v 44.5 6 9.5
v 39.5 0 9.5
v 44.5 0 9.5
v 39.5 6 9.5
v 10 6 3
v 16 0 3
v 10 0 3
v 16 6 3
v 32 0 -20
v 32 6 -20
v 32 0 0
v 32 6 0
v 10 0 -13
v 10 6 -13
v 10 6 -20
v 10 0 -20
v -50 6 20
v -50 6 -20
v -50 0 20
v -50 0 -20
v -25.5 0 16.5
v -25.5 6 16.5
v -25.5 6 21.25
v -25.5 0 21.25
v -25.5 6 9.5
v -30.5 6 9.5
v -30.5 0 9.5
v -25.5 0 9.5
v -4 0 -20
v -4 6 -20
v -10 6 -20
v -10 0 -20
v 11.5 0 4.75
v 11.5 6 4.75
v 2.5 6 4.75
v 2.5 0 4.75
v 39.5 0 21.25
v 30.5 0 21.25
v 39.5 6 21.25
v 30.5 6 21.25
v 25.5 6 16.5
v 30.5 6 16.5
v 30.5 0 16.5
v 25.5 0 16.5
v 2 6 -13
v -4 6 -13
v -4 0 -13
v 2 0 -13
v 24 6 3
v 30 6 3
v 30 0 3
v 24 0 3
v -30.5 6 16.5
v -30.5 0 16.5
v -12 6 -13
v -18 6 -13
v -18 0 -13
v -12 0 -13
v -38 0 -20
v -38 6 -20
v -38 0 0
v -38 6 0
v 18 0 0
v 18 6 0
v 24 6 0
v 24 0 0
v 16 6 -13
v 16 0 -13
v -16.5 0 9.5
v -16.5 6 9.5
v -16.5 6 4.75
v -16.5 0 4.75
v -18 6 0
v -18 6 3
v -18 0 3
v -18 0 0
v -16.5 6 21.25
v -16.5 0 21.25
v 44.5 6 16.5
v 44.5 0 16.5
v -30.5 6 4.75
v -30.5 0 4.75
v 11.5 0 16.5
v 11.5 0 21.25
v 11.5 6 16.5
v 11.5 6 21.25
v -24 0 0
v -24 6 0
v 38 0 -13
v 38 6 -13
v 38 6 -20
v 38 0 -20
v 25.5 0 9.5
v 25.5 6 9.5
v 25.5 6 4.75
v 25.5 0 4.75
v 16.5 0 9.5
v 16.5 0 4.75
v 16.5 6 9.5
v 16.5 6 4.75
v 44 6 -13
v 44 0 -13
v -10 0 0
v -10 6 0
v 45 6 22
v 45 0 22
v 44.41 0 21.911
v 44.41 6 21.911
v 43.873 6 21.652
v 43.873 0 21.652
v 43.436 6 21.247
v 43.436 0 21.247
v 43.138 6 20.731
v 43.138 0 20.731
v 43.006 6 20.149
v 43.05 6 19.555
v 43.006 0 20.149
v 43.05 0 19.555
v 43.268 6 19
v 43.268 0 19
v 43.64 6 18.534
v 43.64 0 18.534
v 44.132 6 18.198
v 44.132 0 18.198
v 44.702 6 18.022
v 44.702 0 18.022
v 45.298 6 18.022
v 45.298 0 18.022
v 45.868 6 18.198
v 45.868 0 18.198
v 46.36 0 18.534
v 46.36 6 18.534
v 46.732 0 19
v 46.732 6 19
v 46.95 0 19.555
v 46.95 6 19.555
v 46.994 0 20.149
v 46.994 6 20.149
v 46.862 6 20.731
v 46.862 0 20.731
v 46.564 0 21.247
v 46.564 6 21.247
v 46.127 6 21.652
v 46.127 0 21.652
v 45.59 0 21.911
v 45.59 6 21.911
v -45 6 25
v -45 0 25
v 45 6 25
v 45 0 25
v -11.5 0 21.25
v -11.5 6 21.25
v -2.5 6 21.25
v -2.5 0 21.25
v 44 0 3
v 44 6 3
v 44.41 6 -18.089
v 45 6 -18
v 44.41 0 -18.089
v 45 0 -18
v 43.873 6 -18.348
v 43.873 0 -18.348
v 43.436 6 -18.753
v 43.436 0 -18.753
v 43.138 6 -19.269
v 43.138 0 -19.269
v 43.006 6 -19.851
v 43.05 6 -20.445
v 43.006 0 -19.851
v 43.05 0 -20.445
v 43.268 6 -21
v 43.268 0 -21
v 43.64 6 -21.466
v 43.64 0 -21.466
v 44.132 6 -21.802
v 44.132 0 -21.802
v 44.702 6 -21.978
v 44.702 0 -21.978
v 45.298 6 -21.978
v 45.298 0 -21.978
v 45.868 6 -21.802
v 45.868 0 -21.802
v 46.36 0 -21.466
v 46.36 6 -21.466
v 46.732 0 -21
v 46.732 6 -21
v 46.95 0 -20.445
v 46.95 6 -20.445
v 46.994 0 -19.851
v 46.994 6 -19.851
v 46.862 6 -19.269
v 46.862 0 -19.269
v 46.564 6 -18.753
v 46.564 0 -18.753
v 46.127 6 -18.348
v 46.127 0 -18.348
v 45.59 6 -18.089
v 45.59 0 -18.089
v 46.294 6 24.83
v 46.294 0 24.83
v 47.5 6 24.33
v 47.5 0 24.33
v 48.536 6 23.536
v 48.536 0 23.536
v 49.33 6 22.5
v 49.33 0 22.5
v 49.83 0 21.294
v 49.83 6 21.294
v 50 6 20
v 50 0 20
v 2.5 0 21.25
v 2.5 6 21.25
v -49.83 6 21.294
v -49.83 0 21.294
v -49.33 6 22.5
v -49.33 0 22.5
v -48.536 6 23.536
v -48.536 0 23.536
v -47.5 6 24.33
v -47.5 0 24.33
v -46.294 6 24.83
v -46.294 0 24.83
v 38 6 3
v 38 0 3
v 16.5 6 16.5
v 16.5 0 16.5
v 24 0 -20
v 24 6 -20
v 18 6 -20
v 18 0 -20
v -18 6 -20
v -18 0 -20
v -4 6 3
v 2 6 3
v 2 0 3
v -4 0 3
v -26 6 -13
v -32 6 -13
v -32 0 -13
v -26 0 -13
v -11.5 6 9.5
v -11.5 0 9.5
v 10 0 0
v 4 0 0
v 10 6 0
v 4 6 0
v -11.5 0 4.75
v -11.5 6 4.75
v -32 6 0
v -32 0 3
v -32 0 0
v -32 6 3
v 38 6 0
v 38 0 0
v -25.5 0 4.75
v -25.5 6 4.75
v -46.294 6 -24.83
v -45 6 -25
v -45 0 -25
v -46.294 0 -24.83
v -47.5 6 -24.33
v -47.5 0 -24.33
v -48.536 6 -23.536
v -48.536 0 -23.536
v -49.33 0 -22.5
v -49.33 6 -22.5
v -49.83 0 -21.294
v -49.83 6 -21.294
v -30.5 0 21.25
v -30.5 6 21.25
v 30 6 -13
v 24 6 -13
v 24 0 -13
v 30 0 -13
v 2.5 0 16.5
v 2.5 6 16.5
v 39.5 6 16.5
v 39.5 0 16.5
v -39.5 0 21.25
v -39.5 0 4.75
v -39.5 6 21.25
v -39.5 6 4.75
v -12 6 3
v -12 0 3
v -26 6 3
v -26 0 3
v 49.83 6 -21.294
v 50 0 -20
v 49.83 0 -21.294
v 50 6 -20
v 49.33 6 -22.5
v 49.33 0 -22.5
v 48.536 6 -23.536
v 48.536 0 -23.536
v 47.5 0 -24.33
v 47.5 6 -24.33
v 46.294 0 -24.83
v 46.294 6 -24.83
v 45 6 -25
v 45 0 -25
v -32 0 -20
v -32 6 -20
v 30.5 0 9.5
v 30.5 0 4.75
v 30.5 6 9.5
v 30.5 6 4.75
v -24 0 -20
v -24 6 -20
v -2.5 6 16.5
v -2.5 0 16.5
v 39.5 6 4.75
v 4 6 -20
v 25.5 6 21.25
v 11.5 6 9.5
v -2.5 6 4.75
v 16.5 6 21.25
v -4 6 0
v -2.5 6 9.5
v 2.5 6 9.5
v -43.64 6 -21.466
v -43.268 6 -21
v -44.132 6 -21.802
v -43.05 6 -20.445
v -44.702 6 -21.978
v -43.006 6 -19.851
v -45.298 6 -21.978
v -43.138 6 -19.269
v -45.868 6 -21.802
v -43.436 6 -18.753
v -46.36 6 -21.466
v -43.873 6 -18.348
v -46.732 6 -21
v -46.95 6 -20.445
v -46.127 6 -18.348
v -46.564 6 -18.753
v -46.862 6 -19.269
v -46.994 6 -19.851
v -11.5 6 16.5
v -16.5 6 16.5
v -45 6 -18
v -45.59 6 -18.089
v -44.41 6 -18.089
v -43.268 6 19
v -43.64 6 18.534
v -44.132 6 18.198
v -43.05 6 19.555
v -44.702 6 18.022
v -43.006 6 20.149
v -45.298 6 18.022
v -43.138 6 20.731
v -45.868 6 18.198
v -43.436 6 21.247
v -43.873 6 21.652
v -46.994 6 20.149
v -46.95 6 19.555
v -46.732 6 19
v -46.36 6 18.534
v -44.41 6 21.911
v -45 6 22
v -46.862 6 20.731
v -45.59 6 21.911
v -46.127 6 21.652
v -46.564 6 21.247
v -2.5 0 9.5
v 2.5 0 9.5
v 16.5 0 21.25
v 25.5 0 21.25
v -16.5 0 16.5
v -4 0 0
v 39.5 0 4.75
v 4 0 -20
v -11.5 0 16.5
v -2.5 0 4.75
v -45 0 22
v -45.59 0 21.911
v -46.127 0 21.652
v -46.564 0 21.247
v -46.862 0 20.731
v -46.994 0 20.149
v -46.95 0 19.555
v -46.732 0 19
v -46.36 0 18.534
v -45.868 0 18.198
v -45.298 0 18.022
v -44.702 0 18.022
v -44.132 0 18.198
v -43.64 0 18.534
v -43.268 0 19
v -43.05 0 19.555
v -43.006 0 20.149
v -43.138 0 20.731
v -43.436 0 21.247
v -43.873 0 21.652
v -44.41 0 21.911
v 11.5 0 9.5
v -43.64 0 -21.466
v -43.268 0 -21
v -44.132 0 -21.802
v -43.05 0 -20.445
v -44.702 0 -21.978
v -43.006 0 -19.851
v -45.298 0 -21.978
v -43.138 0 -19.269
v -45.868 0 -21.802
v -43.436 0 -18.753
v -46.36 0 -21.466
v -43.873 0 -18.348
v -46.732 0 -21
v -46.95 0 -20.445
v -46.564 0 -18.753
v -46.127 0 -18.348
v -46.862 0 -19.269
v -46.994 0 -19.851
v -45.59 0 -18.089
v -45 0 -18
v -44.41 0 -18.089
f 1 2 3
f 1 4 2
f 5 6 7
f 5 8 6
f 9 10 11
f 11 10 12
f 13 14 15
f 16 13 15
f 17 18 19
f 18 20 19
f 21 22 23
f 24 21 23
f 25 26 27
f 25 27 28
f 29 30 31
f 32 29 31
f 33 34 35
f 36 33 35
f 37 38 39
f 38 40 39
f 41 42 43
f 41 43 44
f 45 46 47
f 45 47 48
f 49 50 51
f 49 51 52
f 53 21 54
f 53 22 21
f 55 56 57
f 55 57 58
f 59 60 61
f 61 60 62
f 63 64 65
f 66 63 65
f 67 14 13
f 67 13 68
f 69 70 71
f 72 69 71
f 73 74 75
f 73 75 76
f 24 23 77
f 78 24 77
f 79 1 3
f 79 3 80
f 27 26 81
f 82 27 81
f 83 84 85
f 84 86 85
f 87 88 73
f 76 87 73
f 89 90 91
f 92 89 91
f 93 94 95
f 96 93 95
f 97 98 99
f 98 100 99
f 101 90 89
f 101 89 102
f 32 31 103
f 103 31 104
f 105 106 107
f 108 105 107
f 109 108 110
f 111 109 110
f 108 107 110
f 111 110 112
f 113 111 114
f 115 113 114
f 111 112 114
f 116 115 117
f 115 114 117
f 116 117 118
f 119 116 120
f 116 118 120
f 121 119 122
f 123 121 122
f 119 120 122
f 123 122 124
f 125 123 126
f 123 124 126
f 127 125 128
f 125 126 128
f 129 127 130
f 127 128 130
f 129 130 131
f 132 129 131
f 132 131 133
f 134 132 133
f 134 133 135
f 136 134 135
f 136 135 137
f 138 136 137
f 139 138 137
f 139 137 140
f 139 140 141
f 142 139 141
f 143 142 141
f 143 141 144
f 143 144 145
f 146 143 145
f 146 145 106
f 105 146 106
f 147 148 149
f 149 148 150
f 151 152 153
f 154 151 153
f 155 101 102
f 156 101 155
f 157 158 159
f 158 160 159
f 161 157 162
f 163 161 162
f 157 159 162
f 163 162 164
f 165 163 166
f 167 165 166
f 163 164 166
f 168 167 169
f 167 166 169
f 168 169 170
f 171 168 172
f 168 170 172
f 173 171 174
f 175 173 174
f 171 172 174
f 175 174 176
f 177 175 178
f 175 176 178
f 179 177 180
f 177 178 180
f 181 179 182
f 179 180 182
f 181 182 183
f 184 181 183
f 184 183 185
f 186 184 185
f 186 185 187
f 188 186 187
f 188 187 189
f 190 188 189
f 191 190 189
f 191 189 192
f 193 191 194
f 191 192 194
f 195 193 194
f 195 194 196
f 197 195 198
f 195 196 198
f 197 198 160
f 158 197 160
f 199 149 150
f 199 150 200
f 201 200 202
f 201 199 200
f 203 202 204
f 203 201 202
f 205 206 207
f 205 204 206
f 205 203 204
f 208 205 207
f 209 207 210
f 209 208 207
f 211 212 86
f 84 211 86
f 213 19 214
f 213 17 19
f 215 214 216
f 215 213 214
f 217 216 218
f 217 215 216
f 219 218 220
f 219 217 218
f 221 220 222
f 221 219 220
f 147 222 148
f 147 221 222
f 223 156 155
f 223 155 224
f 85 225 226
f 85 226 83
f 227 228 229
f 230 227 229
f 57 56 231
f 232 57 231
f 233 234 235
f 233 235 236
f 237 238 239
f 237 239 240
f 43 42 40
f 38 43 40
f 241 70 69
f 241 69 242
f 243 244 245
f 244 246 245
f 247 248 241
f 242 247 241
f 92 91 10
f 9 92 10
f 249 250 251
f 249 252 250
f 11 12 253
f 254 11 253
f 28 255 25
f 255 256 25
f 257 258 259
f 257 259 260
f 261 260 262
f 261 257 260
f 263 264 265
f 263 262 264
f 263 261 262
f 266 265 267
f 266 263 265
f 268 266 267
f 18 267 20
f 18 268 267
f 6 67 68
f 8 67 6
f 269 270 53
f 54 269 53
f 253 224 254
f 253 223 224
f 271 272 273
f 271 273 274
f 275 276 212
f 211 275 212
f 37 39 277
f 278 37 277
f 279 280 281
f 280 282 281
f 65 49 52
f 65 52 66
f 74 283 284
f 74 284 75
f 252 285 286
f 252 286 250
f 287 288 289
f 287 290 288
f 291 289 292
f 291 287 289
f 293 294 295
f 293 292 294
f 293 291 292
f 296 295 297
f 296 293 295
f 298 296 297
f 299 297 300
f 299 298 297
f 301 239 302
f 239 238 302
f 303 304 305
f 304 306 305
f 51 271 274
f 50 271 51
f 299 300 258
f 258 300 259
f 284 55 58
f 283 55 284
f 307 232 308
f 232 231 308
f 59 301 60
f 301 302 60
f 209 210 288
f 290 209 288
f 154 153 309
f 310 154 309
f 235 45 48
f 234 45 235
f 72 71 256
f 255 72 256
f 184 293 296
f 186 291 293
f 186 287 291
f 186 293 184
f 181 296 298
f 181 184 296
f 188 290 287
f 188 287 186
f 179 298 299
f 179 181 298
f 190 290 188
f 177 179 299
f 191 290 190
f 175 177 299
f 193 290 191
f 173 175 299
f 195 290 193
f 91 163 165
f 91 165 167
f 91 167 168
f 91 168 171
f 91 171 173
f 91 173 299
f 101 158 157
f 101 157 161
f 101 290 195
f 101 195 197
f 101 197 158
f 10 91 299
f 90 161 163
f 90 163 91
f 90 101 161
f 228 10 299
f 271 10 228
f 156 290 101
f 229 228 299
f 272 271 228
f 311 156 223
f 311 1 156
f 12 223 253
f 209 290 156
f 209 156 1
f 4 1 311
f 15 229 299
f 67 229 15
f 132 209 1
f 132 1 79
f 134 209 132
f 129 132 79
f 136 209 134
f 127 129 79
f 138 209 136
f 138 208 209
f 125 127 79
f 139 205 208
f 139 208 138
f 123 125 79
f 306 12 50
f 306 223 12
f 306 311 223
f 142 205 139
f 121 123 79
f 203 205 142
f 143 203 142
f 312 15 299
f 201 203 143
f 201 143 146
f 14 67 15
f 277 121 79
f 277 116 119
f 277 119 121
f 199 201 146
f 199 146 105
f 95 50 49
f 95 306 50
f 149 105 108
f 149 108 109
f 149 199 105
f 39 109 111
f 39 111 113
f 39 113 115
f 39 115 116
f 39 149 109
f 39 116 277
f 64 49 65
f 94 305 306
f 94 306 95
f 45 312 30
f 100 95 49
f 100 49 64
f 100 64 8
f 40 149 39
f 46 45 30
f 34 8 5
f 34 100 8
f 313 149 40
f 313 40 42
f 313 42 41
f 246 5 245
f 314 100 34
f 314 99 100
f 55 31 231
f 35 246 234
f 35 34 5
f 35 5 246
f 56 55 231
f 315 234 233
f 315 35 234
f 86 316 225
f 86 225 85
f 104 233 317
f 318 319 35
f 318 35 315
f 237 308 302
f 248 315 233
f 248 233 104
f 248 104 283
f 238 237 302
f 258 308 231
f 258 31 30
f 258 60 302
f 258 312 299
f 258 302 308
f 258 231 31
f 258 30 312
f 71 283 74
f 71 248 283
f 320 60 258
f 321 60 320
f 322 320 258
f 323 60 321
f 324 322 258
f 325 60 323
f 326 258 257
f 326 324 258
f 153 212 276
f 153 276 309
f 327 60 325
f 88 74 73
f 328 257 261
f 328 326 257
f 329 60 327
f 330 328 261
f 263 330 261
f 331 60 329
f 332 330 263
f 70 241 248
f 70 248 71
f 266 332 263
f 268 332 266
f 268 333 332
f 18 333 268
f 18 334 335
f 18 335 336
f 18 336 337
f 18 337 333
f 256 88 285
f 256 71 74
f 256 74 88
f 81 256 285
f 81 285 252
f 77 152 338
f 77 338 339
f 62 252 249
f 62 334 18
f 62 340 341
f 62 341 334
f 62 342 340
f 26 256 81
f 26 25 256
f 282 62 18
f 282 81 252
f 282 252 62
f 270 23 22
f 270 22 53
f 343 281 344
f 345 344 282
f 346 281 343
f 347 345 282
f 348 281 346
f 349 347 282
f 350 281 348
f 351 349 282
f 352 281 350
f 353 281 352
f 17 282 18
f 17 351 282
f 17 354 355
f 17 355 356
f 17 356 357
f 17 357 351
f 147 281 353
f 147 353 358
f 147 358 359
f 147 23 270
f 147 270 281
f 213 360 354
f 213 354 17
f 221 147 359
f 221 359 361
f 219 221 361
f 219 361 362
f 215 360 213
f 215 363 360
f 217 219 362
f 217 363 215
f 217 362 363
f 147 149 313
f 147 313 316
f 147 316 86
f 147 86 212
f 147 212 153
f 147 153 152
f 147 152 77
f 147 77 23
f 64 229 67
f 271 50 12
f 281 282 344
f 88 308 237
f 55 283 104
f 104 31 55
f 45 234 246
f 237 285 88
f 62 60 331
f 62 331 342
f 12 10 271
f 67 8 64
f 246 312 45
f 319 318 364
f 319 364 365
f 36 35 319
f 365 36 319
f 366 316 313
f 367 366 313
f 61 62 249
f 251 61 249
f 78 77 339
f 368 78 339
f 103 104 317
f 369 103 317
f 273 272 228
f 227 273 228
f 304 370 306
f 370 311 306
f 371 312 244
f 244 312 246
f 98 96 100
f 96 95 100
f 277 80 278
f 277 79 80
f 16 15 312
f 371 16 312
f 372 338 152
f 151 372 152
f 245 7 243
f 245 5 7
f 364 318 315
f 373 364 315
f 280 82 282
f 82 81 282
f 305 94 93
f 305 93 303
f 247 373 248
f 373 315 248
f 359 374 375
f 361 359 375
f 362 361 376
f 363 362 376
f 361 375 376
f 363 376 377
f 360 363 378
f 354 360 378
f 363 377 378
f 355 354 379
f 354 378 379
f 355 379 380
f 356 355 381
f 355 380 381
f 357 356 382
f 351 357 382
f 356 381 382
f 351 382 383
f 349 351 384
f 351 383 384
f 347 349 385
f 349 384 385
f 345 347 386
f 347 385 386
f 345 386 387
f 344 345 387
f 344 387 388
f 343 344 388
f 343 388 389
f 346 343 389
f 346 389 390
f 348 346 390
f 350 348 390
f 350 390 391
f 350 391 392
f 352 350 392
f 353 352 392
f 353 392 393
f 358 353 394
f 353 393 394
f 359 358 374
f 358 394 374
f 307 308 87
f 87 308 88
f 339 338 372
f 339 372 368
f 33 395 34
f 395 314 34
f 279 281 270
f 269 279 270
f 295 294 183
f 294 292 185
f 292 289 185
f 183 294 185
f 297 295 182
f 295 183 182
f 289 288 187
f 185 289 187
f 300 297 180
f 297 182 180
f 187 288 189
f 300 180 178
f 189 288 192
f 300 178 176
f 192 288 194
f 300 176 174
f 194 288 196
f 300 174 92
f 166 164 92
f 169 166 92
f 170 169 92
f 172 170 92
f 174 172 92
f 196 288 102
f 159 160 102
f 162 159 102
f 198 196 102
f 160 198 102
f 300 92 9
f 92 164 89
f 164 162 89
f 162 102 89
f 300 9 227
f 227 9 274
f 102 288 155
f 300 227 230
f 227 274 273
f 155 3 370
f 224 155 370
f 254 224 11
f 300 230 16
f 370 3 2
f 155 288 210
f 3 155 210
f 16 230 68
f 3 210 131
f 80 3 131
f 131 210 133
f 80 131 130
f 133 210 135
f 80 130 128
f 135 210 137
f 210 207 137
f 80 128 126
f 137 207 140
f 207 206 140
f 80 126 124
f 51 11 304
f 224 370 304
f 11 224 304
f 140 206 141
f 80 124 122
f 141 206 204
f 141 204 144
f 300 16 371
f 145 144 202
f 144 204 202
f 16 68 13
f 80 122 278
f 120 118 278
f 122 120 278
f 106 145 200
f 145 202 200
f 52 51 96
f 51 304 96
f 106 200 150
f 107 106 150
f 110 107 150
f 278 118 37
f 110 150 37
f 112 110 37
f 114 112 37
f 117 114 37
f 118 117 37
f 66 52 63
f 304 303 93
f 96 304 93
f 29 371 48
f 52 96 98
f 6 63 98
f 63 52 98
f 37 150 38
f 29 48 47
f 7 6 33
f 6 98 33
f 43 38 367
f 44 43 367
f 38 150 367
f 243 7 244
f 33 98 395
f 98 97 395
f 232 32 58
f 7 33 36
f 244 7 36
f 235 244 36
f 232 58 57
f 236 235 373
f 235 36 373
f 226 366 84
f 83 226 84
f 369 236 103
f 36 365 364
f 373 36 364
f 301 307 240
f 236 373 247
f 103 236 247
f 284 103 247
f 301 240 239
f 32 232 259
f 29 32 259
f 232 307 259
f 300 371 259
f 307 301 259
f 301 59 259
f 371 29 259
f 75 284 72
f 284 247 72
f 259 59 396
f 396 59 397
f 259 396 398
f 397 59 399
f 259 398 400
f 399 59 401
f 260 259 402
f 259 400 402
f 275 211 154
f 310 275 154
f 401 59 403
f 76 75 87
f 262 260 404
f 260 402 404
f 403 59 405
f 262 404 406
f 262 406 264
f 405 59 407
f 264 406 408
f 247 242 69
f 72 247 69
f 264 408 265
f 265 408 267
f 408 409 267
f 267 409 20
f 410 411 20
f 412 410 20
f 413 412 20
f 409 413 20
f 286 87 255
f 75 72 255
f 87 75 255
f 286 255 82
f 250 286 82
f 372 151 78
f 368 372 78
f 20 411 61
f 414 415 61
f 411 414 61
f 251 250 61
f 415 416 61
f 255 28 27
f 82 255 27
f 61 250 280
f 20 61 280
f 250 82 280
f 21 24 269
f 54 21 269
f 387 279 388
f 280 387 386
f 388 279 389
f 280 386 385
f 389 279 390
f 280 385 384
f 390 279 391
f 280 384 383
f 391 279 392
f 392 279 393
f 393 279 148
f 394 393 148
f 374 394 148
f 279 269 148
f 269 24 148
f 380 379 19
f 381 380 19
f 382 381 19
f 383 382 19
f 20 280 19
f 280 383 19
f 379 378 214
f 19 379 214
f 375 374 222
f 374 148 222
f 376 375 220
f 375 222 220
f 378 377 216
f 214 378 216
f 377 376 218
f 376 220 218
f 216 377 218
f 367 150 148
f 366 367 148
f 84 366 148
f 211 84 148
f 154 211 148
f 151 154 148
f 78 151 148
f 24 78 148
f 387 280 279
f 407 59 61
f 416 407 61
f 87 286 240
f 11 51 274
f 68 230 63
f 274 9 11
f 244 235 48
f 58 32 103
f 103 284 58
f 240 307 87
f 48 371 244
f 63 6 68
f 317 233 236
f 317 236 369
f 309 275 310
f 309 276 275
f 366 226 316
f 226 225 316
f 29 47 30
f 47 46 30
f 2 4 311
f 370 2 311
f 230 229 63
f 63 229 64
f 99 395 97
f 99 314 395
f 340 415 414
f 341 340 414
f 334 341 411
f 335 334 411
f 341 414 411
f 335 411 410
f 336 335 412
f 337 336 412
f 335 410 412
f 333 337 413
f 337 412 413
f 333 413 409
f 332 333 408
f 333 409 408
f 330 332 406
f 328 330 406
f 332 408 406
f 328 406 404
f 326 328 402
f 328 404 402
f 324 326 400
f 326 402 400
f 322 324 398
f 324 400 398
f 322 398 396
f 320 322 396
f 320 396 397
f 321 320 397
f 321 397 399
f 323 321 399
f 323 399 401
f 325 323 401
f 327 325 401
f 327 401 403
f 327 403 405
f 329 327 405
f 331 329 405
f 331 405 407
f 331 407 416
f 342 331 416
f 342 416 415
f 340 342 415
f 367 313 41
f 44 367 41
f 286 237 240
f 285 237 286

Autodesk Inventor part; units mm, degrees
ref_plane "YZ Plane" through (0, 0, 0) normal (1, 0, 0) x (0, 1, 0)
ref_plane "XZ Plane" through (0, 0, 0) normal (0, 1, 0) x (-1, 0, 0)
ref_plane "XY Plane" through (0, 0, 0) normal (0, 0, 1) x (1, 0, 0)
sketch "Sketch1" plane through (0, 0, 0) normal (0, 1, 0) x (-1, 0, 0)
  line L0 (50, 25) -> (-50, 25)
  line L1 (-50, 25) -> (-50, -25)
  line L2 (-50, -25) -> (50, -25)
  line L3 (50, -25) -> (50, 25)
  line L4 (50, 25) -> (-50, -25) construction
  line L5 (-50, 25) -> (50, -25) construction
  point P0 (0, 0)
  dimension "d0" = 100
  dimension "d1" = 50
extrude "Extrusion1" add sketch "Sketch1" along normal blind 6
fillet "Fillet1" radius 5 4 edges at (50, 3, 25) (50, 3, -25) (-50, 3, -25) (-50, 3, 25)
sketch "Sketch2" plane through (0, 6, 0) normal (0, 1, 0) x (1, 0, 0)
  line L0 (-39.5, -21.25) -> (-30.5, -21.25)
  line L1 (-30.5, -21.25) -> (-30.5, -4.75)
  line L2 (-30.5, -4.75) -> (-39.5, -4.75)
  line L3 (-39.5, -4.75) -> (-39.5, -21.25)
  line L4 (-39.5, -21.25) -> (-30.5, -4.75) construction
  line L5 (-30.5, -21.25) -> (-39.5, -4.75) construction
  line L6 (-25.5, -21.25) -> (-16.5, -21.25)
  line L7 (-16.5, -21.25) -> (-16.5, -4.75)
  line L8 (-16.5, -4.75) -> (-25.5, -4.75)
  line L9 (-25.5, -4.75) -> (-25.5, -21.25)
  line L10 (-25.5, -21.25) -> (-16.5, -4.75) construction
  line L11 (-16.5, -21.25) -> (-25.5, -4.75) construction
  line L12 (-11.5, -21.25) -> (-2.5, -21.25)
  line L13 (-2.5, -21.25) -> (-2.5, -4.75)
  line L14 (-2.5, -4.75) -> (-11.5, -4.75)
  line L15 (-11.5, -4.75) -> (-11.5, -21.25)
  line L16 (-11.5, -21.25) -> (-2.5, -4.75) construction
  line L17 (-2.5, -21.25) -> (-11.5, -4.75) construction
  line L18 (2.5, -21.25) -> (11.5, -21.25)
  line L19 (11.5, -21.25) -> (11.5, -4.75)
  line L20 (11.5, -4.75) -> (2.5, -4.75)
  line L21 (2.5, -4.75) -> (2.5, -21.25)
  line L22 (2.5, -21.25) -> (11.5, -4.75) construction
  line L23 (11.5, -21.25) -> (2.5, -4.75) construction
  line L24 (16.5, -21.25) -> (25.5, -21.25)
  line L25 (25.5, -21.25) -> (25.5, -4.75)
  line L26 (25.5, -4.75) -> (16.5, -4.75)
  line L27 (16.5, -4.75) -> (16.5, -21.25)
  line L28 (16.5, -21.25) -> (25.5, -4.75) construction
  line L29 (25.5, -21.25) -> (16.5, -4.75) construction
  line L30 (30.5, -21.25) -> (39.5, -21.25)
  line L31 (39.5, -21.25) -> (39.5, -4.75)
  line L32 (39.5, -4.75) -> (30.5, -4.75)
  line L33 (30.5, -4.75) -> (30.5, -21.25)
  line L34 (30.5, -21.25) -> (39.5, -4.75) construction
  line L35 (39.5, -21.25) -> (30.5, -4.75) construction
  point P0 (0, 0)
  point P1 (-35, -13)
  point P2 (-21, -13)
  point P3 (-7, -13)
  point P4 (7, -13)
  point P5 (21, -13)
  point P6 (35, -13)
  dimension "d5" = 9
  dimension "d6" = 16.5
  dimension "d9" = 14
  dimension "d14" = 7
  dimension "d15" = 13
extrude "Extrusion2" cut sketch "Sketch2" against normal blind 10
sketch "Sketch3" plane through (0, 6, 0) normal (0, 1, 0) x (1, 0, 0)
  line L0 (-16.5, -21.25) -> (-25.5, -21.25) projected
  line L1 (-45, -25) -> (45, -25) projected
  line L2 (45, 25) -> (-45, 25) projected
  line L3 (-38, 0) -> (-32, 0)
  line L4 (-32, 0) -> (-32, 20)
  line L5 (-32, 20) -> (-38, 20)
  line L6 (-38, 20) -> (-38, 0)
  line L7 (-38, 0) -> (-32, 20) construction
  line L8 (-32, 0) -> (-38, 20) construction
  line L9 (-24, 0) -> (-18, 0)
  line L10 (-18, 0) -> (-18, 20)
  line L11 (-18, 20) -> (-24, 20)
  line L12 (-24, 20) -> (-24, 0)
  line L13 (-24, 0) -> (-18, 20) construction
  line L14 (-18, 0) -> (-24, 20) construction
  line L15 (-10, 0) -> (-4, 0)
  line L16 (-4, 0) -> (-4, 20)
  line L17 (-4, 20) -> (-10, 20)
  line L18 (-10, 20) -> (-10, 0)
  line L19 (-10, 0) -> (-4, 20) construction
  line L20 (-4, 0) -> (-10, 20) construction
  line L21 (4, 0) -> (10, 0)
  line L22 (10, 0) -> (10, 20)
  line L23 (10, 20) -> (4, 20)
  line L24 (4, 20) -> (4, 0)
  line L25 (4, 0) -> (10, 20) construction
  line L26 (10, 0) -> (4, 20) construction
  line L27 (18, 0) -> (24, 0)
  line L28 (24, 0) -> (24, 20)
  line L29 (24, 20) -> (18, 20)
  line L30 (18, 20) -> (18, 0)
  line L31 (18, 0) -> (24, 20) construction
  line L32 (24, 0) -> (18, 20) construction
  line L33 (32, 0) -> (38, 0)
  line L34 (38, 0) -> (38, 20)
  line L35 (38, 20) -> (32, 20)
  line L36 (32, 20) -> (32, 0)
  line L37 (32, 0) -> (38, 20) construction
  line L38 (38, 0) -> (32, 20) construction
  point P0 (0, 0)
  point P1 (-35, 10)
  point P2 (-21, 10)
  point P3 (-7, 10)
  point P4 (7, 10)
  point P5 (21, 10)
  point P6 (35, 10)
  dimension "d20" = 14
  dimension "d25" = 7
  dimension "d26" = 6
  dimension "d27" = 20
  dimension "d28" = 5
  dimension "d29" = 3.75
extrude "Extrusion3" cut sketch "Sketch3" against normal blind 10
sketch "Sketch4" plane through (0, 6, 0) normal (0, 1, 0) x (1, 0, 0)
  arc A0 (-50, -20) -> (-45, -25) centre (-45, -20) ccw projected
  arc A1 (45, -25) -> (50, -20) centre (45, -20) ccw projected
  arc A2 (50, 20) -> (45, 25) centre (45, 20) ccw projected
  arc A3 (-45, 25) -> (-50, 20) centre (-45, 20) ccw projected
  point P0 (0, 0)
hole "Hole1" at (-45, 6, -20) at (45, 6, -20) at (45, 6, 20) at (-45, 6, 20) direction (0, -1, 0) diameter 4 end through all
sketch "Sketch5" plane through (0, 6, 0) normal (0, 1, 0) x (1, 0, 0)
  line L0 (-30.5, -4.75) -> (-30.5, -21.25) projected
  line L1 (-39.5, -4.75) -> (-30.5, -4.75) projected
  line L2 (-25.5, -21.25) -> (-25.5, -4.75) projected
  line L3 (-25.5, -16.5) -> (-30.5, -16.5)
  line L4 (-30.5, -16.5) -> (-30.5, -9.5)
  line L5 (-30.5, -9.5) -> (-25.5, -9.5)
  line L6 (-25.5, -9.5) -> (-25.5, -16.5)
  line L7 (-25.5, -16.5) -> (-30.5, -9.5) construction
  line L8 (-30.5, -16.5) -> (-25.5, -9.5) construction
  line L9 (-11.5, -16.5) -> (-16.5, -16.5)
  line L10 (-16.5, -16.5) -> (-16.5, -9.5)
  line L11 (-16.5, -9.5) -> (-11.5, -9.5)
  line L12 (-11.5, -9.5) -> (-11.5, -16.5)
  line L13 (-11.5, -16.5) -> (-16.5, -9.5) construction
  line L14 (-16.5, -16.5) -> (-11.5, -9.5) construction
  line L15 (2.5, -16.5) -> (-2.5, -16.5)
  line L16 (-2.5, -16.5) -> (-2.5, -9.5)
  line L17 (-2.5, -9.5) -> (2.5, -9.5)
  line L18 (2.5, -9.5) -> (2.5, -16.5)
  line L19 (2.5, -16.5) -> (-2.5, -9.5) construction
  line L20 (-2.5, -16.5) -> (2.5, -9.5) construction
  line L21 (16.5, -16.5) -> (11.5, -16.5)
  line L22 (11.5, -16.5) -> (11.5, -9.5)
  line L23 (11.5, -9.5) -> (16.5, -9.5)
  line L24 (16.5, -9.5) -> (16.5, -16.5)
  line L25 (16.5, -16.5) -> (11.5, -9.5) construction
  line L26 (11.5, -16.5) -> (16.5, -9.5) construction
  line L27 (30.5, -16.5) -> (25.5, -16.5)
  line L28 (25.5, -16.5) -> (25.5, -9.5)
  line L29 (25.5, -9.5) -> (30.5, -9.5)
  line L30 (30.5, -9.5) -> (30.5, -16.5)
  line L31 (30.5, -16.5) -> (25.5, -9.5) construction
  line L32 (25.5, -16.5) -> (30.5, -9.5) construction
  line L33 (44.5, -16.5) -> (39.5, -16.5)
  line L34 (39.5, -16.5) -> (39.5, -9.5)
  line L35 (39.5, -9.5) -> (44.5, -9.5)
  line L36 (44.5, -9.5) -> (44.5, -16.5)
  line L37 (44.5, -16.5) -> (39.5, -9.5) construction
  line L38 (39.5, -16.5) -> (44.5, -9.5) construction
  point P0 (-39.5, -21.25)
  point P1 (0, 0)
  point P2 (-28, -13)
  point P3 (-14, -13)
  point P4 (0, -13)
  point P5 (14, -13)
  point P6 (28, -13)
  point P7 (42, -13)
  dimension "d39" = 0
  dimension "d40" = 7
  dimension "d41" = 16.5
  dimension "d42" = 8.25
  dimension "d45" = 14
extrude "Extrusion4" cut sketch "Sketch5" against normal blind 10
sketch "Sketch6" plane through (0, 6, 0) normal (0, 1, 0) x (1, 0, 0)
  line L0 (-32, 20) -> (-32, 0) projected
  line L1 (-32, 0) -> (-38, 0) projected
  line L2 (-38, 20) -> (-32, 20) projected
  line L3 (-26, -3) -> (-32, -3)
  line L4 (-32, -3) -> (-32, 13)
  line L5 (-32, 13) -> (-26, 13)
  line L6 (-26, 13) -> (-26, -3)
  line L7 (-26, -3) -> (-32, 13) construction
  line L8 (-32, -3) -> (-26, 13) construction
  line L9 (-12, -3) -> (-18, -3)
  line L10 (-18, -3) -> (-18, 13)
  line L11 (-18, 13) -> (-12, 13)
  line L12 (-12, 13) -> (-12, -3)
  line L13 (-12, -3) -> (-18, 13) construction
  line L14 (-18, -3) -> (-12, 13) construction
  line L15 (2, -3) -> (-4, -3)
  line L16 (-4, -3) -> (-4, 13)
  line L17 (-4, 13) -> (2, 13)
  line L18 (2, 13) -> (2, -3)
  line L19 (2, -3) -> (-4, 13) construction
  line L20 (-4, -3) -> (2, 13) construction
  line L21 (16, -3) -> (10, -3)
  line L22 (10, -3) -> (10, 13)
  line L23 (10, 13) -> (16, 13)
  line L24 (16, 13) -> (16, -3)
  line L25 (16, -3) -> (10, 13) construction
  line L26 (10, -3) -> (16, 13) construction
  line L27 (30, -3) -> (24, -3)
  line L28 (24, -3) -> (24, 13)
  line L29 (24, 13) -> (30, 13)
  line L30 (30, 13) -> (30, -3)
  line L31 (30, -3) -> (24, 13) construction
  line L32 (24, -3) -> (30, 13) construction
  line L33 (44, -3) -> (38, -3)
  line L34 (38, -3) -> (38, 13)
  line L35 (38, 13) -> (44, 13)
  line L36 (44, 13) -> (44, -3)
  line L37 (44, -3) -> (38, 13) construction
  line L38 (38, -3) -> (44, 13) construction
  point P0 (0, 0)
  point P1 (-29, 5)
  point P2 (-18, 0)
  point P3 (-15, 5)
  point P4 (-4, 0)
  point P5 (-1, 5)
  point P6 (10, 0)
  point P7 (13, 5)
  point P8 (24, 0)
  point P9 (27, 5)
  point P10 (38, 0)
  point P11 (41, 5)
  dimension "d52" = 6
  dimension "d53" = 3
  dimension "d54" = 7
  dimension "d57" = 14
extrude "Extrusion5" cut sketch "Sketch6" against normal blind 10
equation "\"d14\" = 0.5 * d9"
equation "\"d25\" = 0.5 * d20"
equation "\"d42\" = 0.5 * d41"
properties part number "AcrylicUpperCore" material "Acrylic, Clear"
